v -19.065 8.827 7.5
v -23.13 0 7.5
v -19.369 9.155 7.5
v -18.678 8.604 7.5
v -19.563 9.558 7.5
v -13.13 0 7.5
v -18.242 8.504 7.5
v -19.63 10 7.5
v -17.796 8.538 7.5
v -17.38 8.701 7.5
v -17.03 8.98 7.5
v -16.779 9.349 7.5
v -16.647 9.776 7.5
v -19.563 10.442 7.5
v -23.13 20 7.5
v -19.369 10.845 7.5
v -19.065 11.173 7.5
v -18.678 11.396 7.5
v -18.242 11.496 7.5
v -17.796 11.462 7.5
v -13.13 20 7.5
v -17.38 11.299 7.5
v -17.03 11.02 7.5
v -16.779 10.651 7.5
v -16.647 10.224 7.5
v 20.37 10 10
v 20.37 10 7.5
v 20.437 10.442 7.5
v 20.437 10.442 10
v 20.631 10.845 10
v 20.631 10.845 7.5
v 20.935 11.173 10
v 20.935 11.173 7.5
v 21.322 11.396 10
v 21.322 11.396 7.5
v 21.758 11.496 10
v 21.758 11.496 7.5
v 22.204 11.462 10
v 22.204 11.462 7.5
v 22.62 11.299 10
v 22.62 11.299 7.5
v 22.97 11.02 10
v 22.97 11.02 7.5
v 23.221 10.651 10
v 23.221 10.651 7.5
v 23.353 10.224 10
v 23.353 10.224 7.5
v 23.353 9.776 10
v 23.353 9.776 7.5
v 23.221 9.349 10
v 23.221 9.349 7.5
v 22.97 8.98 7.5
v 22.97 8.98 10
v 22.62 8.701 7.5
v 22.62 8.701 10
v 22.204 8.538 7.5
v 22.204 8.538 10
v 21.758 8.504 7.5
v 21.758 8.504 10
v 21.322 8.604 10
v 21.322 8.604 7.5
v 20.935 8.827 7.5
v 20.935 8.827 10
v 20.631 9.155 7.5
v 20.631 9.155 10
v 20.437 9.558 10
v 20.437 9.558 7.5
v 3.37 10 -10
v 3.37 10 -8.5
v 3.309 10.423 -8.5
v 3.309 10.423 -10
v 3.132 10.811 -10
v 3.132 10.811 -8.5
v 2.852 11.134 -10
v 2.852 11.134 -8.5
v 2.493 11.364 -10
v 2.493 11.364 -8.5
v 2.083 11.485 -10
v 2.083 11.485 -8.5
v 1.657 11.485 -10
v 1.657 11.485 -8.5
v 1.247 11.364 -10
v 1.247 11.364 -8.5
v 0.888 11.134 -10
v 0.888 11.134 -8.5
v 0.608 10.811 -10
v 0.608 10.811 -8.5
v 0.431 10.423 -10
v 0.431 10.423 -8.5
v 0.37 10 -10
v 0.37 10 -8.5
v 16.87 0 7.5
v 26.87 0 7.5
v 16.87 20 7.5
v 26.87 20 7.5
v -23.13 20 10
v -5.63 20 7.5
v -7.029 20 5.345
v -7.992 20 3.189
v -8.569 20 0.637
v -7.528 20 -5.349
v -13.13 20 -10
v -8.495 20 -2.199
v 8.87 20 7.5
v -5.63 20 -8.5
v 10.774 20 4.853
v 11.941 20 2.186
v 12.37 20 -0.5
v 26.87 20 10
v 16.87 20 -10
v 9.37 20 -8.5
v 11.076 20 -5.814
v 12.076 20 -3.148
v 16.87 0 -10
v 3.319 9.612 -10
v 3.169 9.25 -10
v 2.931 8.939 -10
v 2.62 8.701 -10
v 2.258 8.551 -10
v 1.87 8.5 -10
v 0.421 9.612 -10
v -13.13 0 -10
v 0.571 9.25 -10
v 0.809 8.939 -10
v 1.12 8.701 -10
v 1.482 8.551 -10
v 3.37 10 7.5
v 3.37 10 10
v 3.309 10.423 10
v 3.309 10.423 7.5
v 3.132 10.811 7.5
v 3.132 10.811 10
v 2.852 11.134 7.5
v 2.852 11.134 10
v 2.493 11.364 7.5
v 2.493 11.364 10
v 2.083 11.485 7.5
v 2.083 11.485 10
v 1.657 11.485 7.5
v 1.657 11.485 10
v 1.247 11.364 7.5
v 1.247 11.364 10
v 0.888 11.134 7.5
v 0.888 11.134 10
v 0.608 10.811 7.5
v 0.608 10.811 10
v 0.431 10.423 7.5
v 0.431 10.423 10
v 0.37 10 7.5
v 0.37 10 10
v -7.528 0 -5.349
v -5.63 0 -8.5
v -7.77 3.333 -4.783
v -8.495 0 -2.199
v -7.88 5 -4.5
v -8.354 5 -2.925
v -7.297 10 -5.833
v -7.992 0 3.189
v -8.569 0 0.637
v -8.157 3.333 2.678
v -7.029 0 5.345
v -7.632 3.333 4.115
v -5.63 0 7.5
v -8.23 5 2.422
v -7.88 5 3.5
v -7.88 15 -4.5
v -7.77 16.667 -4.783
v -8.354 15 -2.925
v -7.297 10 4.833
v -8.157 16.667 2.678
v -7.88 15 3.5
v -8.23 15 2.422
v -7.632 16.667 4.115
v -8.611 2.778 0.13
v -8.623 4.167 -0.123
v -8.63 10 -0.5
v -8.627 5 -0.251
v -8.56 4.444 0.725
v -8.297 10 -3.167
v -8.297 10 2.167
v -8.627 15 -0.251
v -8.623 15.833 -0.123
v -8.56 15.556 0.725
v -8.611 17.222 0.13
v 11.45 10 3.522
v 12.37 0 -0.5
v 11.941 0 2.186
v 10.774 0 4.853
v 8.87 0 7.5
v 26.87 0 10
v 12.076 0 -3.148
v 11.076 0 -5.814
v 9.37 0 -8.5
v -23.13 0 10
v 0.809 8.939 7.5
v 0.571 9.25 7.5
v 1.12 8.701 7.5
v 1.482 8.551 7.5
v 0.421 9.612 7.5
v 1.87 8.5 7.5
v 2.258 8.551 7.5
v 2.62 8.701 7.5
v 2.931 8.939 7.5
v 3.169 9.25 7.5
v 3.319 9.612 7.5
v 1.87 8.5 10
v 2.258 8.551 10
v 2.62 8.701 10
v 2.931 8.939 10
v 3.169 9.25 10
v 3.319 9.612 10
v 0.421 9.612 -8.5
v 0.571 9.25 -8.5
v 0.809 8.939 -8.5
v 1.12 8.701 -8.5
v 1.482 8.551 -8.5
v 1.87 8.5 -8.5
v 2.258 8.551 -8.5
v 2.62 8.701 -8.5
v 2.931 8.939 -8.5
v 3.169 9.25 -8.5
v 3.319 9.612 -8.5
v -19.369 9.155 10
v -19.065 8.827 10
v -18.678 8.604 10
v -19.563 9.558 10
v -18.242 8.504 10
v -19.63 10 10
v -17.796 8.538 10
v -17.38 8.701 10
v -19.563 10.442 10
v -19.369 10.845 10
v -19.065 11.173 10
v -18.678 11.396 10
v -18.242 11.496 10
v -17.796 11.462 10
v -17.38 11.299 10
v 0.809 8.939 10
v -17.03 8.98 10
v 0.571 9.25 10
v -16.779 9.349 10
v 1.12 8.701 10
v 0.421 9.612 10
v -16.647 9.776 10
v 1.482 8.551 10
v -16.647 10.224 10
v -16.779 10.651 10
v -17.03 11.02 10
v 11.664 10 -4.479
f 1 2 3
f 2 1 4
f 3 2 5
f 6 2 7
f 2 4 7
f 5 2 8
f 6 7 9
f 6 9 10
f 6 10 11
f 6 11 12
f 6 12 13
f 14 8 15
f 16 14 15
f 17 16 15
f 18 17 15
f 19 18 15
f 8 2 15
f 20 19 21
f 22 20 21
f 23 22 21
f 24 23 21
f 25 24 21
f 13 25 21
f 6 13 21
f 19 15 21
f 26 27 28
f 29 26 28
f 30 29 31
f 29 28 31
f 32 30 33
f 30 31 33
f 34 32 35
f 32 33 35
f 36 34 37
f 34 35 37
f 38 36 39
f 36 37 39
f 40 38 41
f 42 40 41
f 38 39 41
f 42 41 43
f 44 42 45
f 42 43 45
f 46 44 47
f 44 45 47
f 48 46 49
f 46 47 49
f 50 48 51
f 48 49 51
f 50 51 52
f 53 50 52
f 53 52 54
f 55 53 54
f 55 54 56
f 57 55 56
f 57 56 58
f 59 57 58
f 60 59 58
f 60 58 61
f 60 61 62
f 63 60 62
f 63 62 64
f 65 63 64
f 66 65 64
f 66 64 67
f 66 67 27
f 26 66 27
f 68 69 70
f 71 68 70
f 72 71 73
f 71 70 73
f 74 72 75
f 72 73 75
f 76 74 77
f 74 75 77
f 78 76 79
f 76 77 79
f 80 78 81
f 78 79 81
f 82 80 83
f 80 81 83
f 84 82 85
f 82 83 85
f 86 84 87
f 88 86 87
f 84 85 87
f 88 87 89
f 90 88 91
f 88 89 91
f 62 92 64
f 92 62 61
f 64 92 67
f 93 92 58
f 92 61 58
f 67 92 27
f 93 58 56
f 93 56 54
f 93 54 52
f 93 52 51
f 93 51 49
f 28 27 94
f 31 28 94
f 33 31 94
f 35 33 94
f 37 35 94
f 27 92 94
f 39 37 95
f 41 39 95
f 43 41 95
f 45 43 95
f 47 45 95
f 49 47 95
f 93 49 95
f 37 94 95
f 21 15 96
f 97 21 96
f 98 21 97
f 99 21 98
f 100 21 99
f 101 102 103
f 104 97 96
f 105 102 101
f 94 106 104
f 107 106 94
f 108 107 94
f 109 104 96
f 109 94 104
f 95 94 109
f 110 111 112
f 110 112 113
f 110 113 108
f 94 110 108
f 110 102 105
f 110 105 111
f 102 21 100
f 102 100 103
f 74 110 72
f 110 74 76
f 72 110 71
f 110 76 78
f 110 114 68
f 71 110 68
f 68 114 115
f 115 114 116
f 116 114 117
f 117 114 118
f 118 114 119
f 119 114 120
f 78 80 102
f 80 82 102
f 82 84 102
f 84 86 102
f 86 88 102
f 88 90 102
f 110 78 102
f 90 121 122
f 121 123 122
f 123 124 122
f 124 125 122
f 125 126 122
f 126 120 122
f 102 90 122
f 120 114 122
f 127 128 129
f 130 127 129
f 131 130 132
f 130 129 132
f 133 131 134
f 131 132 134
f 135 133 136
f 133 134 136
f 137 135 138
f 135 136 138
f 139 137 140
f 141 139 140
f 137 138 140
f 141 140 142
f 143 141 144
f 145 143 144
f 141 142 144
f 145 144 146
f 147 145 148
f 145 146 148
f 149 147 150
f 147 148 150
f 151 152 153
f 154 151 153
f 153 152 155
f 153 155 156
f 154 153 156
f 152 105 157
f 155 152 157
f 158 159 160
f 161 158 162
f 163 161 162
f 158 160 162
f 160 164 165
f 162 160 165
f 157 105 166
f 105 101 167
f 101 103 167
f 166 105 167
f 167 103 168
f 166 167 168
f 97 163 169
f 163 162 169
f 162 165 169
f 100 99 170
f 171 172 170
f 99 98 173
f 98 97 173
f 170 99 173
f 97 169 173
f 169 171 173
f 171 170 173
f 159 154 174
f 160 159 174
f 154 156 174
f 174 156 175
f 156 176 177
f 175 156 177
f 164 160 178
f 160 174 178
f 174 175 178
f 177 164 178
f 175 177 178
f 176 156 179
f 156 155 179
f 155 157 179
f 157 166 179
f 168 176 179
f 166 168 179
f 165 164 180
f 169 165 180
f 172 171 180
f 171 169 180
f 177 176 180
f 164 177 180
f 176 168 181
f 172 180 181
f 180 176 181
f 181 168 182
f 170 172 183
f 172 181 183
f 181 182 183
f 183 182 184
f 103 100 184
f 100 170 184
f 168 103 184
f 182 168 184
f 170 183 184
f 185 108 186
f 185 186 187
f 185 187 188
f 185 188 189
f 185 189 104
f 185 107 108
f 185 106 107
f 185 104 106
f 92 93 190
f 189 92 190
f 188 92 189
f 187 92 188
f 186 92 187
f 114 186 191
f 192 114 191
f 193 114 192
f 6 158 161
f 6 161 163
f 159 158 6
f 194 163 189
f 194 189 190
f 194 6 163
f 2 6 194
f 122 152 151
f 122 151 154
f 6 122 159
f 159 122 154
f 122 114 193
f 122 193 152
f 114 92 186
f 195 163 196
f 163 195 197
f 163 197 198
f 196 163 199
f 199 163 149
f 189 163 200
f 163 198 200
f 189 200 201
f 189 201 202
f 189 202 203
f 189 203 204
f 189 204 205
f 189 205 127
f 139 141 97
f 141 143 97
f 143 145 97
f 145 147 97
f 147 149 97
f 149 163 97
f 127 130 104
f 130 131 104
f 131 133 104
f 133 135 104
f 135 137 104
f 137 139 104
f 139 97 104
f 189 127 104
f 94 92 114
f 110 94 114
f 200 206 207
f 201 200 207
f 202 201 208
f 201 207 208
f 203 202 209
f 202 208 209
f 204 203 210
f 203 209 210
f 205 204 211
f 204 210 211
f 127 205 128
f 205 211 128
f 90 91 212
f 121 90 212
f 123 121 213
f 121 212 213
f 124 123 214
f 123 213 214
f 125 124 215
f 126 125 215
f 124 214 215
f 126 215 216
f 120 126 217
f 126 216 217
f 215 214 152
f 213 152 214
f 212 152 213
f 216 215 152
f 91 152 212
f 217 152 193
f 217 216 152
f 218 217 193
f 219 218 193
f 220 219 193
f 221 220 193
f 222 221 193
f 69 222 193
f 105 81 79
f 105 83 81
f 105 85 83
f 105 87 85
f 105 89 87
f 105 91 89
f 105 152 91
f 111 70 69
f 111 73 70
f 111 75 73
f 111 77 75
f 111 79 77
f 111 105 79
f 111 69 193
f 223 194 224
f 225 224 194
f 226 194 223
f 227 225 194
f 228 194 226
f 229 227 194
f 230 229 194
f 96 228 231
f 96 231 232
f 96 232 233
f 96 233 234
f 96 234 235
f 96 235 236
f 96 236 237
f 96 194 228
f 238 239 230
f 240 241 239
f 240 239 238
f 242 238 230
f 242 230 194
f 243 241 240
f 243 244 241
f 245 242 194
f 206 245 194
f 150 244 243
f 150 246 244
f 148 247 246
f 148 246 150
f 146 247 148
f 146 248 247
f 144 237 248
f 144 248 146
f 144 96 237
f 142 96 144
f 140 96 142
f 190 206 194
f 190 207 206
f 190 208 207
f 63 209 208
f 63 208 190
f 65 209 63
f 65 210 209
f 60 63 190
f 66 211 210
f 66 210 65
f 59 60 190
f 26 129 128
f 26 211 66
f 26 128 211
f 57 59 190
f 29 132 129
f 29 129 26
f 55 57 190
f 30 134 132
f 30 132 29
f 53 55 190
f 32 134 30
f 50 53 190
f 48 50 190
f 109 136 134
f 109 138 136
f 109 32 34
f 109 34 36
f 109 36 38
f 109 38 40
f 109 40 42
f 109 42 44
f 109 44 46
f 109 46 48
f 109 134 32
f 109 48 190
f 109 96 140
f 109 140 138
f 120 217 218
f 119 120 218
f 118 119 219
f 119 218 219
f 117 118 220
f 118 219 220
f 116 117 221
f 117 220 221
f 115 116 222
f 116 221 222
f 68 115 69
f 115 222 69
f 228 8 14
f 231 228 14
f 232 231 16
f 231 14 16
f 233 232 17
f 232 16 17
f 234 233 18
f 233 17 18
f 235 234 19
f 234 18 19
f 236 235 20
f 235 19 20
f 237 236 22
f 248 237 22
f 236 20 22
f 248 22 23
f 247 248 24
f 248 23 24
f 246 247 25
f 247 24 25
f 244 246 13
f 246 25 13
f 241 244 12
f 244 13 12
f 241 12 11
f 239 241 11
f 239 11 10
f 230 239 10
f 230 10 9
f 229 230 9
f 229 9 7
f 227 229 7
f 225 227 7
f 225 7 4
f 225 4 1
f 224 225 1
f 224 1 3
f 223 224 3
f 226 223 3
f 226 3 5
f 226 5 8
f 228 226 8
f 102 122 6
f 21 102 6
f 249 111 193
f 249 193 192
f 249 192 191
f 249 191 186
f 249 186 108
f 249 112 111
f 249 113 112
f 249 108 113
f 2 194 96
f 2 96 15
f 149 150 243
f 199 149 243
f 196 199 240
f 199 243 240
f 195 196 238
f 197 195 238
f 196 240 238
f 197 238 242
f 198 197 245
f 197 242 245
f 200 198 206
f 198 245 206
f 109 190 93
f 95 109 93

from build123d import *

# Parameters (mm, degrees)
BOSS_EXTRUDE3_DEPTH  = 20
SKETCH3_W            = 10
SKETCH3_H            = 2.5
BOSS_EXTRUDE4_DEPTH  = 20
SKETCH4_R            = 1.5
CUT_EXTRUDE1_DEPTH   = 3
BOSS_EXTRUDE5_DEPTH  = 20
SKETCH6_W            = 20
SKETCH6_H            = 0.5
CUT_EXTRUDE2_DEPTH   = 20
BOSS_EXTRUDE11_DEPTH = 20
CUT_EXTRUDE4_DEPTH   = 20
SKETCH11_W           = 20
SKETCH11_H           = 0.5
CUT_EXTRUDE5_DEPTH   = 20
BOSS_EXTRUDE14_DEPTH = 20
CUT_EXTRUDE9_DEPTH   = 20
CUT_EXTRUDE12_DEPTH  = 20
CUT_EXTRUDE13_DEPTH  = 20
BOSS_EXTRUDE16_DEPTH = 20
BOSS_EXTRUDE17_DEPTH = 20
CUT_EXTRUDE14_DEPTH  = 20


with BuildPart() as part:
    # Sketch1 → Boss-Extrude3 (new body)
    with BuildSketch(Plane(origin=(0, 0, 0), x_dir=(1, 0, 0), z_dir=(0, 1, 0))):
        with BuildLine():
            add(Edge.make_bspline(
                [(-8.130019969, 7.5), (-11.130019969, 3.75), (-11.130019969, 0)],
                knots=[0, 0, 0, 0.5, 0.5, 0.5], degree=2))
            Line((-8.130019969, 7.5), (-13.130019969, 7.5))
            Line((-13.130019969, 7.5), (-13.130019969, -10))
            Line((-13.130019969, -10), (16.869980031, -10))
            Line((16.869980031, -10), (16.869980031, -7.5))
            Line((16.869980031, -7.5), (11.869980031, -7.5))
            Line((11.869980031, -7.5), (-8.130019969, -7.5))
            add(Edge.make_bspline(
                [(-11.130019969, 0), (-11.130019969, -3.75), (-8.130019969, -7.5)],
                knots=[0.5, 0.5, 0.5, 1, 1, 1], degree=2))
        make_face()
        with BuildLine():
            Line((-13.130019969, 7.5), (-8.130019969, 7.5))
            Line((-8.130019969, 7.5), (11.869980031, 7.5))
            add(Edge.make_bspline(
                [(11.869980031, 7.5), (14.869980031, 3.75), (14.869980031, 0)],
                knots=[0, 0, 0, 0.5, 0.5, 0.5], degree=2))
            add(Edge.make_bspline(
                [(14.869980031, 0), (14.869980031, -3.75), (11.869980031, -7.5)],
                knots=[0.5, 0.5, 0.5, 1, 1, 1], degree=2))
            Line((11.869980031, -7.5), (16.869980031, -7.5))
            Line((16.869980031, -7.5), (16.869980031, 10))
            Line((16.869980031, 10), (-13.130019969, 10))
            Line((-13.130019969, 10), (-13.130019969, 7.5))
        make_face()
    extrude(amount=BOSS_EXTRUDE3_DEPTH)

    # Sketch3 → Boss-Extrude4 (add)
    with BuildSketch(Plane(origin=(0, 20, 0), x_dir=(1, 0, 0), z_dir=(0, 1, 0))):
        with Locations((-18.130019969, -8.75)):
            Rectangle(SKETCH3_W, SKETCH3_H)
        with Locations((21.869980031, -8.75)):
            Rectangle(SKETCH3_W, SKETCH3_H)
    extrude(amount=-BOSS_EXTRUDE4_DEPTH)

    # Sketch4 → Cut-Extrude1 (cut)
    with BuildSketch(Plane(origin=(0, 0, 7.5), x_dir=(-1, 0, 0), z_dir=(0, 0, -1))):
        with Locations((18.130019969, 10)):
            Circle(SKETCH4_R)
        with Locations((-21.869980031, 10)):
            Circle(SKETCH4_R)
    extrude(amount=-CUT_EXTRUDE1_DEPTH, mode=Mode.SUBTRACT)

    # Sketch5 → Boss-Extrude5 (add)
    with BuildSketch(Plane(origin=(0, 20, 0), x_dir=(1, 0, 0), z_dir=(0, 1, 0))):
        with BuildLine():
            Line((-8.130019969, 7.5), (-8.130019969, -7.5))
            add(Edge.make_bspline(
                [(-8.130019969, -7.5), (-14.130019969, 0), (-8.130019969, 7.5)],
                knots=[0, 0, 0, 1, 1, 1], degree=2))
        make_face()
        with BuildLine():
            Line((11.869980031, 7.5), (11.869980031, -7.5))
            add(Edge.make_bspline(
                [(11.869980031, 7.5), (17.869980031, 0), (11.869980031, -7.5)],
                knots=[0, 0, 0, 1, 1, 1], degree=2))
        make_face()
    extrude(amount=-BOSS_EXTRUDE5_DEPTH)

    # Sketch6 → Cut-Extrude2 (cut)
    with BuildSketch(Plane(origin=(0, 20, 0), x_dir=(1, 0, 0), z_dir=(0, 1, 0))):
        with Locations((1.869980031, 7.75)):
            Rectangle(SKETCH6_W, SKETCH6_H)
    extrude(amount=-CUT_EXTRUDE2_DEPTH, mode=Mode.SUBTRACT)

    # Sketch8 → Boss-Extrude11 (add)
    with BuildSketch(Plane(origin=(0, 20, 0), x_dir=(1, 0, 0), z_dir=(0, 1, 0))):
        with BuildLine():
            Line((-5.130019969, 8), (-8.130019969, 8))
            Line((-8.130019969, 8), (-8.130019969, 0.25))
            add(Edge.make_bspline(
                [(-8.130019969, 0.25), (-8.130019969, 4.125), (-5.130019969, 8)],
                knots=[0.5, 0.5, 0.5, 1, 1, 1], degree=2))
        make_face()
        with BuildLine():
            add(Edge.make_bspline(
                [(-5.130019969, -7.5), (-8.130019969, -3.625), (-8.130019969, 0.25)],
                knots=[0, 0, 0, 0.5, 0.5, 0.5], degree=2))
            Line((-8.130019969, 0.25), (-8.130019969, -7.5))
            Line((-8.130019969, -7.5), (-5.130019969, -7.5))
        make_face()
        with BuildLine():
            Line((11.869980031, 8), (8.869980031, 8))
            add(Edge.make_bspline(
                [(8.869980031, 8), (11.869980028, 4.125000005), (11.869980031, 0.25000001)],
                knots=[0, 0, 0, 0.499999999, 0.499999999, 0.499999999], degree=2))
            Line((11.869980031, 0.25000001), (11.869980031, 8))
        make_face()
        with BuildLine():
            Line((11.869980031, -7.5), (11.869980031, 0.25000001))
            add(Edge.make_bspline(
                [(11.869980031, 0.25000001), (11.869980035, -3.624999995), (8.869980031, -7.5)],
                knots=[0.499999999, 0.499999999, 0.499999999, 1, 1, 1], degree=2))
            Line((8.869980031, -7.5), (11.869980031, -7.5))
        make_face()
    extrude(amount=-BOSS_EXTRUDE11_DEPTH)

    # Sketch10 → Cut-Extrude4 (cut)
    with BuildSketch(Plane(origin=(0, 20, 0), x_dir=(1, 0, 0), z_dir=(0, 1, 0))):
        with BuildLine():
            add(Edge.make_bspline(
                [(-8.130019969, 0.25), (-8.130019969, 4.125), (-5.130019969, 8)],
                knots=[0.5, 0.5, 0.5, 1, 1, 1], degree=2))
            Line((-5.130019969, 8), (-8.130019969, 8))
            Line((-8.130019969, 8), (-8.130019969, 0.25))
        make_face()
        with BuildLine():
            Line((-8.130019969, -7.5), (-5.130019969, -7.5))
            add(Edge.make_bspline(
                [(-5.130019969, -7.5), (-8.130019969, -3.625), (-8.130019969, 0.25)],
                knots=[0, 0, 0, 0.5, 0.5, 0.5], degree=2))
            Line((-8.130019969, 0.25), (-8.130019969, -7.5))
        make_face()
        with BuildLine():
            add(Edge.make_bspline(
                [(11.869980031, 0.25000001), (11.869980035, -3.624999995), (8.869980031, -7.5)],
                knots=[0.499999999, 0.499999999, 0.499999999, 1, 1, 1], degree=2))
            Line((8.869980031, -7.5), (11.869980031, -7.5))
            Line((11.869980031, -7.5), (11.869980031, 0.25000001))
        make_face()
        with BuildLine():
            Line((11.869980031, 8), (8.869980031, 8))
            add(Edge.make_bspline(
                [(8.869980031, 8), (11.869980028, 4.125000005), (11.869980031, 0.25000001)],
                knots=[0, 0, 0, 0.499999999, 0.499999999, 0.499999999], degree=2))
            Line((11.869980031, 0.25000001), (11.869980031, 8))
        make_face()
    extrude(amount=-CUT_EXTRUDE4_DEPTH, mode=Mode.SUBTRACT)

    # Sketch11 → Cut-Extrude5 (cut)
    with BuildSketch(Plane(origin=(0, 20, 0), x_dir=(1, 0, 0), z_dir=(0, 1, 0))):
        with Locations((1.869980031, 8.25)):
            Rectangle(SKETCH11_W, SKETCH11_H)
    extrude(amount=-CUT_EXTRUDE5_DEPTH, mode=Mode.SUBTRACT)

    # Sketch12 → Boss-Extrude14 (add)
    with BuildSketch(Plane(origin=(0, 20, 0), x_dir=(1, 0, 0), z_dir=(0, 1, 0))):
        with BuildLine():
            Line((-8.130019969, 8.5), (-8.130019969, 0.5))
            add(Edge.make_bspline(
                [(-5.130019969, 8.5), (-8.130019969, 4.5), (-8.130019969, 0.5)],
                knots=[0, 0, 0, 0.5, 0.5, 0.5], degree=2))
            Line((-5.130019969, 8.5), (-8.130019969, 8.5))
        make_face()
        with BuildLine():
            add(Edge.make_bspline(
                [(-8.130019969, 0.5), (-8.130019969, -3.5), (-5.130019969, -7.5)],
                knots=[0.5, 0.5, 0.5, 1, 1, 1], degree=2))
            Line((-8.130019969, 0.5), (-8.130019969, -7.5))
            Line((-8.130019969, -7.5), (-5.130019969, -7.5))
        make_face()
        with BuildLine():
            add(Edge.make_bspline(
                [(11.869980031, 0.5), (11.869980031, -3.5), (8.869980031, -7.5)],
                knots=[0.5, 0.5, 0.5, 1, 1, 1], degree=2))
            Line((8.869980031, -7.5), (11.869980031, -7.5))
            Line((11.869980031, -7.5), (11.869980031, 0.5))
        make_face()
        with BuildLine():
            Line((11.869980031, 8.5), (8.869980031, 8.5))
            add(Edge.make_bspline(
                [(8.869980031, 8.5), (11.869980031, 4.5), (11.869980031, 0.5)],
                knots=[0, 0, 0, 0.5, 0.5, 0.5], degree=2))
            Line((11.869980031, 0.5), (11.869980031, 8.5))
        make_face()
    extrude(amount=-BOSS_EXTRUDE14_DEPTH)

    # Sketch14 → Cut-Extrude9 (cut)
    with BuildSketch(Plane.XY.offset(10)):
        with BuildLine():
            ThreePointArc((0.369980031, 10), (0.80931986, 8.939339828), (1.869980031, 8.5))
            Line((1.869980031, 8.5), (1.869980031, 10))
            Line((1.869980031, 10), (0.369980031, 10))
        make_face()
        with BuildLine():
            Line((1.869980031, 10), (1.869980031, 8.5))
            ThreePointArc((1.869980031, 8.5), (2.930640203, 8.939339828), (3.369980031, 10))
            ThreePointArc((3.369980031, 10), (1.869980031, 11.5), (0.369980031, 10))
            Line((0.369980031, 10), (1.869980031, 10))
        make_face()
        with BuildLine():
            ThreePointArc((0.369980031, 10), (0.80931986, 8.939339828), (1.869980031, 8.5))
            Line((1.869980031, 8.5), (1.869980031, 10))
            Line((1.869980031, 10), (0.369980031, 10))
        make_face()
        with BuildLine():
            Line((1.869980031, 10), (1.869980031, 8.5))
            ThreePointArc((1.869980031, 8.5), (2.930640203, 8.939339828), (3.369980031, 10))
            ThreePointArc((3.369980031, 10), (1.869980031, 11.5), (0.369980031, 10))
            Line((0.369980031, 10), (1.869980031, 10))
        make_face()
    extrude(amount=-CUT_EXTRUDE9_DEPTH, mode=Mode.SUBTRACT)

    # Sketch15 → Cut-Extrude12 (cut)
    with BuildSketch(Plane(origin=(0, 20, 0), x_dir=(1, 0, 0), z_dir=(0, 1, 0))):
        with BuildLine():
            add(Edge.make_bspline(
                [(-5.130019969, 8.5), (-8.130019937, 4.500000043), (-8.130019969, 0.500000085)],
                knots=[0, 0, 0, 0.499999995, 0.499999995, 0.499999995], degree=2))
            Line((-5.130019969, 8.5), (-5.630019969, 8.5))
            add(Edge.make_bspline(
                [(-5.630019969, 8.5), (-8.130019942, 4.500000043), (-8.130019969, 0.500000085)],
                knots=[0, 0, 0, 0.499999995, 0.499999995, 0.499999995], degree=2))
        make_face()
        with BuildLine():
            add(Edge.make_bspline(
                [(-8.130019969, 0.500000085), (-8.13002, -3.499999957), (-5.130019969, -7.5)],
                knots=[0.499999995, 0.499999995, 0.499999995, 1, 1, 1], degree=2))
            add(Edge.make_bspline(
                [(-8.130019969, 0.500000085), (-8.130019995, -3.499999957), (-5.630019969, -7.5)],
                knots=[0.499999995, 0.499999995, 0.499999995, 1, 1, 1], degree=2))
            Line((-5.630019969, -7.5), (-5.130019969, -7.5))
        make_face()
        with BuildLine():
            Line((-4.630019969, 8.5), (-5.130019969, 8.5))
            add(Edge.make_bspline(
                [(-5.130019969, 8.5), (-8.130019937, 4.500000043), (-8.130019969, 0.500000085)],
                knots=[0, 0, 0, 0.499999995, 0.499999995, 0.499999995], degree=2))
            add(Edge.make_bspline(
                [(-8.130019969, 0.500000085), (-8.13002, -3.499999957), (-5.130019969, -7.5)],
                knots=[0.499999995, 0.499999995, 0.499999995, 1, 1, 1], degree=2))
            Line((-5.130019969, -7.5), (-4.630019969, -7.5))
            Line((-4.630019969, -7.5), (-4.630019969, 8.5))
        make_face()
    extrude(amount=-CUT_EXTRUDE12_DEPTH, mode=Mode.SUBTRACT)

    # Sketch17 → Cut-Extrude13 (cut)
    with BuildSketch(Plane(origin=(0, 20, 0), x_dir=(1, 0, 0), z_dir=(0, 1, 0))):
        with BuildLine():
            add(Edge.make_bspline(
                [(-8.130019969, 0.5), (-8.130019968, 4.5), (-5.630019969, 8.5)],
                knots=[0.5, 0.5, 0.5, 1, 1, 1], degree=2))
            add(Edge.make_bspline(
                [(-5.630019969, 8.5), (-8.630019969, 4.5), (-8.630019969, 0.5)],
                knots=[0, 0, 0, 0.5, 0.5, 0.5], degree=2))
            Line((-8.630019969, 0.5), (-8.130019969, 0.5))
        make_face()
        with BuildLine():
            Line((-8.130019969, 0.5), (-8.630019969, 0.5))
            add(Edge.make_bspline(
                [(-8.630019969, 0.5), (-8.630019969, -3.5), (-5.630019969, -7.5)],
                knots=[0.5, 0.5, 0.5, 1, 1, 1], degree=2))
            add(Edge.make_bspline(
                [(-5.630019969, -7.5), (-8.130019969, -3.5), (-8.130019969, 0.5)],
                knots=[0, 0, 0, 0.5, 0.5, 0.5], degree=2))
        make_face()
        with BuildLine():
            add(Edge.make_bspline(
                [(-8.130019969, 0.5), (-8.130019968, 4.5), (-5.630019969, 8.5)],
                knots=[0.5, 0.5, 0.5, 1, 1, 1], degree=2))
            add(Edge.make_bspline(
                [(-5.630019969, 8.5), (-8.630019969, 4.5), (-8.630019969, 0.5)],
                knots=[0, 0, 0, 0.5, 0.5, 0.5], degree=2))
            Line((-8.630019969, 0.5), (-8.130019969, 0.5))
        make_face()
        with BuildLine():
            Line((-8.130019969, 0.5), (-8.630019969, 0.5))
            add(Edge.make_bspline(
                [(-8.630019969, 0.5), (-8.630019969, -3.5), (-5.630019969, -7.5)],
                knots=[0.5, 0.5, 0.5, 1, 1, 1], degree=2))
            add(Edge.make_bspline(
                [(-5.630019969, -7.5), (-8.130019969, -3.5), (-8.130019969, 0.5)],
                knots=[0, 0, 0, 0.5, 0.5, 0.5], degree=2))
        make_face()
        with BuildLine():
            Line((-5.630019969, 0.5), (-5.630019969, 8.5))
            add(Edge.make_bspline(
                [(-8.130019969, 0.5), (-8.130019968, 4.5), (-5.630019969, 8.5)],
                knots=[0.5, 0.5, 0.5, 1, 1, 1], degree=2))
            Line((-8.130019969, 0.5), (-5.630019969, 0.5))
        make_face()
        with BuildLine():
            Line((-5.630019969, -7.5), (-5.630019969, 0.5))
            Line((-5.630019969, 0.5), (-8.130019969, 0.5))
            add(Edge.make_bspline(
                [(-5.630019969, -7.5), (-8.130019969, -3.5), (-8.130019969, 0.5)],
                knots=[0, 0, 0, 0.5, 0.5, 0.5], degree=2))
        make_face()
        with BuildLine():
            Line((-5.630019969, 0.5), (-5.630019969, 8.5))
            add(Edge.make_bspline(
                [(-8.130019969, 0.5), (-8.130019968, 4.5), (-5.630019969, 8.5)],
                knots=[0.5, 0.5, 0.5, 1, 1, 1], degree=2))
            Line((-8.130019969, 0.5), (-5.630019969, 0.5))
        make_face()
        with BuildLine():
            Line((-5.630019969, -7.5), (-5.630019969, 0.5))
            Line((-5.630019969, 0.5), (-8.130019969, 0.5))
            add(Edge.make_bspline(
                [(-5.630019969, -7.5), (-8.130019969, -3.5), (-8.130019969, 0.5)],
                knots=[0, 0, 0, 0.5, 0.5, 0.5], degree=2))
        make_face()
    extrude(amount=-CUT_EXTRUDE13_DEPTH, mode=Mode.SUBTRACT)

    # Sketch18 → Boss-Extrude16 (add)
    with BuildSketch(Plane(origin=(0, 20, 0), x_dir=(1, 0, 0), z_dir=(0, 1, 0))):
        with BuildLine():
            add(Edge.make_bspline(
                [(8.869980031, 8.5), (9.131367244, 8.151483717), (9.369980031, 7.802967433)],
                knots=[0, 0, 0, 0.043564535, 0.043564535, 0.043564535], degree=2))
            Line((8.869980031, 8.5), (8.869980031, -7.5))
            add(Edge.make_bspline(
                [(9.369980031, -6.802967433), (9.131367244, -7.151483717), (8.869980031, -7.5)],
                knots=[0.956435465, 0.956435465, 0.956435465, 1, 1, 1], degree=2))
            Line((9.369980031, -6.802967433), (9.369980031, 7.802967433))
        make_face()
    extrude(amount=-BOSS_EXTRUDE16_DEPTH)

    # Sketch19 → Boss-Extrude17 (add)
    with BuildSketch(Plane(origin=(0, 20, 0), x_dir=(1, 0, 0), z_dir=(0, 1, 0))):
        with BuildLine():
            Line((9.369980032, 7.802967433), (9.369980032, -6.802967433))
            add(Edge.make_bspline(
                [(9.369980032, 7.802967433), (14.369980032, 0.5), (9.369980032, -6.802967433)],
                knots=[0, 0, 0, 1, 1, 1], degree=2))
        make_face()
    extrude(amount=-BOSS_EXTRUDE17_DEPTH)

    # Sketch20 → Cut-Extrude14 (cut)
    with BuildSketch(Plane(origin=(0, 20, 0), x_dir=(1, 0, 0), z_dir=(0, 1, 0))):
        with BuildLine():
            Line((8.869980031, 8.5), (8.869980031, 0.5))
            Line((8.869980031, 0.5), (11.869980031, 0.5))
            add(Edge.make_bspline(
                [(8.869980031, 8.5), (11.869980031, 4.5), (11.869980031, 0.5)],
                knots=[0, 0, 0, 0.5, 0.5, 0.5], degree=2))
        make_face()
        with BuildLine():
            Line((11.869980031, 0.5), (8.869980031, 0.5))
            Line((8.869980031, 0.5), (8.869980031, -7.5))
            add(Edge.make_bspline(
                [(11.869980031, 0.5), (11.869980031, -3.5), (8.869980031, -7.5)],
                knots=[0.5, 0.5, 0.5, 1, 1, 1], degree=2))
        make_face()
        with BuildLine():
            Line((8.869980031, 8.5), (8.869980031, 0.5))
            Line((8.869980031, 0.5), (11.869980031, 0.5))
            add(Edge.make_bspline(
                [(8.869980031, 8.5), (11.869980031, 4.5), (11.869980031, 0.5)],
                knots=[0, 0, 0, 0.5, 0.5, 0.5], degree=2))
        make_face()
        with BuildLine():
            Line((11.869980031, 0.5), (8.869980031, 0.5))
            Line((8.869980031, 0.5), (8.869980031, -7.5))
            add(Edge.make_bspline(
                [(11.869980031, 0.5), (11.869980031, -3.5), (8.869980031, -7.5)],
                knots=[0.5, 0.5, 0.5, 1, 1, 1], degree=2))
        make_face()
        with BuildLine():
            add(Edge.make_bspline(
                [(8.869980031, 8.5), (11.869980031, 4.5), (11.869980031, 0.5)],
                knots=[0, 0, 0, 0.5, 0.5, 0.5], degree=2))
            Line((11.869980031, 0.5), (12.369980031, 0.5))
            add(Edge.make_bspline(
                [(9.369980031, 8.5), (12.458639974, 4.457382103), (12.369980031, 0.5)],
                knots=[0, 0, 0, 0.494555468, 0.494555468, 0.494555468], degree=2))
            Line((9.369980031, 8.5), (8.869980031, 8.5))
        make_face()
        with BuildLine():
            Line((12.369980031, 0.5), (11.869980031, 0.5))
            add(Edge.make_bspline(
                [(11.869980031, 0.5), (11.869980031, -3.5), (8.869980031, -7.5)],
                knots=[0.5, 0.5, 0.5, 1, 1, 1], degree=2))
            add(Edge.make_bspline(
                [(12.369980031, 0.5), (12.279367985, -3.544515269), (8.869980031, -7.5)],
                knots=[0.494555468, 0.494555468, 0.494555468, 1, 1, 1], degree=2))
        make_face()
    extrude(amount=-CUT_EXTRUDE14_DEPTH, mode=Mode.SUBTRACT)


solid = part.part
